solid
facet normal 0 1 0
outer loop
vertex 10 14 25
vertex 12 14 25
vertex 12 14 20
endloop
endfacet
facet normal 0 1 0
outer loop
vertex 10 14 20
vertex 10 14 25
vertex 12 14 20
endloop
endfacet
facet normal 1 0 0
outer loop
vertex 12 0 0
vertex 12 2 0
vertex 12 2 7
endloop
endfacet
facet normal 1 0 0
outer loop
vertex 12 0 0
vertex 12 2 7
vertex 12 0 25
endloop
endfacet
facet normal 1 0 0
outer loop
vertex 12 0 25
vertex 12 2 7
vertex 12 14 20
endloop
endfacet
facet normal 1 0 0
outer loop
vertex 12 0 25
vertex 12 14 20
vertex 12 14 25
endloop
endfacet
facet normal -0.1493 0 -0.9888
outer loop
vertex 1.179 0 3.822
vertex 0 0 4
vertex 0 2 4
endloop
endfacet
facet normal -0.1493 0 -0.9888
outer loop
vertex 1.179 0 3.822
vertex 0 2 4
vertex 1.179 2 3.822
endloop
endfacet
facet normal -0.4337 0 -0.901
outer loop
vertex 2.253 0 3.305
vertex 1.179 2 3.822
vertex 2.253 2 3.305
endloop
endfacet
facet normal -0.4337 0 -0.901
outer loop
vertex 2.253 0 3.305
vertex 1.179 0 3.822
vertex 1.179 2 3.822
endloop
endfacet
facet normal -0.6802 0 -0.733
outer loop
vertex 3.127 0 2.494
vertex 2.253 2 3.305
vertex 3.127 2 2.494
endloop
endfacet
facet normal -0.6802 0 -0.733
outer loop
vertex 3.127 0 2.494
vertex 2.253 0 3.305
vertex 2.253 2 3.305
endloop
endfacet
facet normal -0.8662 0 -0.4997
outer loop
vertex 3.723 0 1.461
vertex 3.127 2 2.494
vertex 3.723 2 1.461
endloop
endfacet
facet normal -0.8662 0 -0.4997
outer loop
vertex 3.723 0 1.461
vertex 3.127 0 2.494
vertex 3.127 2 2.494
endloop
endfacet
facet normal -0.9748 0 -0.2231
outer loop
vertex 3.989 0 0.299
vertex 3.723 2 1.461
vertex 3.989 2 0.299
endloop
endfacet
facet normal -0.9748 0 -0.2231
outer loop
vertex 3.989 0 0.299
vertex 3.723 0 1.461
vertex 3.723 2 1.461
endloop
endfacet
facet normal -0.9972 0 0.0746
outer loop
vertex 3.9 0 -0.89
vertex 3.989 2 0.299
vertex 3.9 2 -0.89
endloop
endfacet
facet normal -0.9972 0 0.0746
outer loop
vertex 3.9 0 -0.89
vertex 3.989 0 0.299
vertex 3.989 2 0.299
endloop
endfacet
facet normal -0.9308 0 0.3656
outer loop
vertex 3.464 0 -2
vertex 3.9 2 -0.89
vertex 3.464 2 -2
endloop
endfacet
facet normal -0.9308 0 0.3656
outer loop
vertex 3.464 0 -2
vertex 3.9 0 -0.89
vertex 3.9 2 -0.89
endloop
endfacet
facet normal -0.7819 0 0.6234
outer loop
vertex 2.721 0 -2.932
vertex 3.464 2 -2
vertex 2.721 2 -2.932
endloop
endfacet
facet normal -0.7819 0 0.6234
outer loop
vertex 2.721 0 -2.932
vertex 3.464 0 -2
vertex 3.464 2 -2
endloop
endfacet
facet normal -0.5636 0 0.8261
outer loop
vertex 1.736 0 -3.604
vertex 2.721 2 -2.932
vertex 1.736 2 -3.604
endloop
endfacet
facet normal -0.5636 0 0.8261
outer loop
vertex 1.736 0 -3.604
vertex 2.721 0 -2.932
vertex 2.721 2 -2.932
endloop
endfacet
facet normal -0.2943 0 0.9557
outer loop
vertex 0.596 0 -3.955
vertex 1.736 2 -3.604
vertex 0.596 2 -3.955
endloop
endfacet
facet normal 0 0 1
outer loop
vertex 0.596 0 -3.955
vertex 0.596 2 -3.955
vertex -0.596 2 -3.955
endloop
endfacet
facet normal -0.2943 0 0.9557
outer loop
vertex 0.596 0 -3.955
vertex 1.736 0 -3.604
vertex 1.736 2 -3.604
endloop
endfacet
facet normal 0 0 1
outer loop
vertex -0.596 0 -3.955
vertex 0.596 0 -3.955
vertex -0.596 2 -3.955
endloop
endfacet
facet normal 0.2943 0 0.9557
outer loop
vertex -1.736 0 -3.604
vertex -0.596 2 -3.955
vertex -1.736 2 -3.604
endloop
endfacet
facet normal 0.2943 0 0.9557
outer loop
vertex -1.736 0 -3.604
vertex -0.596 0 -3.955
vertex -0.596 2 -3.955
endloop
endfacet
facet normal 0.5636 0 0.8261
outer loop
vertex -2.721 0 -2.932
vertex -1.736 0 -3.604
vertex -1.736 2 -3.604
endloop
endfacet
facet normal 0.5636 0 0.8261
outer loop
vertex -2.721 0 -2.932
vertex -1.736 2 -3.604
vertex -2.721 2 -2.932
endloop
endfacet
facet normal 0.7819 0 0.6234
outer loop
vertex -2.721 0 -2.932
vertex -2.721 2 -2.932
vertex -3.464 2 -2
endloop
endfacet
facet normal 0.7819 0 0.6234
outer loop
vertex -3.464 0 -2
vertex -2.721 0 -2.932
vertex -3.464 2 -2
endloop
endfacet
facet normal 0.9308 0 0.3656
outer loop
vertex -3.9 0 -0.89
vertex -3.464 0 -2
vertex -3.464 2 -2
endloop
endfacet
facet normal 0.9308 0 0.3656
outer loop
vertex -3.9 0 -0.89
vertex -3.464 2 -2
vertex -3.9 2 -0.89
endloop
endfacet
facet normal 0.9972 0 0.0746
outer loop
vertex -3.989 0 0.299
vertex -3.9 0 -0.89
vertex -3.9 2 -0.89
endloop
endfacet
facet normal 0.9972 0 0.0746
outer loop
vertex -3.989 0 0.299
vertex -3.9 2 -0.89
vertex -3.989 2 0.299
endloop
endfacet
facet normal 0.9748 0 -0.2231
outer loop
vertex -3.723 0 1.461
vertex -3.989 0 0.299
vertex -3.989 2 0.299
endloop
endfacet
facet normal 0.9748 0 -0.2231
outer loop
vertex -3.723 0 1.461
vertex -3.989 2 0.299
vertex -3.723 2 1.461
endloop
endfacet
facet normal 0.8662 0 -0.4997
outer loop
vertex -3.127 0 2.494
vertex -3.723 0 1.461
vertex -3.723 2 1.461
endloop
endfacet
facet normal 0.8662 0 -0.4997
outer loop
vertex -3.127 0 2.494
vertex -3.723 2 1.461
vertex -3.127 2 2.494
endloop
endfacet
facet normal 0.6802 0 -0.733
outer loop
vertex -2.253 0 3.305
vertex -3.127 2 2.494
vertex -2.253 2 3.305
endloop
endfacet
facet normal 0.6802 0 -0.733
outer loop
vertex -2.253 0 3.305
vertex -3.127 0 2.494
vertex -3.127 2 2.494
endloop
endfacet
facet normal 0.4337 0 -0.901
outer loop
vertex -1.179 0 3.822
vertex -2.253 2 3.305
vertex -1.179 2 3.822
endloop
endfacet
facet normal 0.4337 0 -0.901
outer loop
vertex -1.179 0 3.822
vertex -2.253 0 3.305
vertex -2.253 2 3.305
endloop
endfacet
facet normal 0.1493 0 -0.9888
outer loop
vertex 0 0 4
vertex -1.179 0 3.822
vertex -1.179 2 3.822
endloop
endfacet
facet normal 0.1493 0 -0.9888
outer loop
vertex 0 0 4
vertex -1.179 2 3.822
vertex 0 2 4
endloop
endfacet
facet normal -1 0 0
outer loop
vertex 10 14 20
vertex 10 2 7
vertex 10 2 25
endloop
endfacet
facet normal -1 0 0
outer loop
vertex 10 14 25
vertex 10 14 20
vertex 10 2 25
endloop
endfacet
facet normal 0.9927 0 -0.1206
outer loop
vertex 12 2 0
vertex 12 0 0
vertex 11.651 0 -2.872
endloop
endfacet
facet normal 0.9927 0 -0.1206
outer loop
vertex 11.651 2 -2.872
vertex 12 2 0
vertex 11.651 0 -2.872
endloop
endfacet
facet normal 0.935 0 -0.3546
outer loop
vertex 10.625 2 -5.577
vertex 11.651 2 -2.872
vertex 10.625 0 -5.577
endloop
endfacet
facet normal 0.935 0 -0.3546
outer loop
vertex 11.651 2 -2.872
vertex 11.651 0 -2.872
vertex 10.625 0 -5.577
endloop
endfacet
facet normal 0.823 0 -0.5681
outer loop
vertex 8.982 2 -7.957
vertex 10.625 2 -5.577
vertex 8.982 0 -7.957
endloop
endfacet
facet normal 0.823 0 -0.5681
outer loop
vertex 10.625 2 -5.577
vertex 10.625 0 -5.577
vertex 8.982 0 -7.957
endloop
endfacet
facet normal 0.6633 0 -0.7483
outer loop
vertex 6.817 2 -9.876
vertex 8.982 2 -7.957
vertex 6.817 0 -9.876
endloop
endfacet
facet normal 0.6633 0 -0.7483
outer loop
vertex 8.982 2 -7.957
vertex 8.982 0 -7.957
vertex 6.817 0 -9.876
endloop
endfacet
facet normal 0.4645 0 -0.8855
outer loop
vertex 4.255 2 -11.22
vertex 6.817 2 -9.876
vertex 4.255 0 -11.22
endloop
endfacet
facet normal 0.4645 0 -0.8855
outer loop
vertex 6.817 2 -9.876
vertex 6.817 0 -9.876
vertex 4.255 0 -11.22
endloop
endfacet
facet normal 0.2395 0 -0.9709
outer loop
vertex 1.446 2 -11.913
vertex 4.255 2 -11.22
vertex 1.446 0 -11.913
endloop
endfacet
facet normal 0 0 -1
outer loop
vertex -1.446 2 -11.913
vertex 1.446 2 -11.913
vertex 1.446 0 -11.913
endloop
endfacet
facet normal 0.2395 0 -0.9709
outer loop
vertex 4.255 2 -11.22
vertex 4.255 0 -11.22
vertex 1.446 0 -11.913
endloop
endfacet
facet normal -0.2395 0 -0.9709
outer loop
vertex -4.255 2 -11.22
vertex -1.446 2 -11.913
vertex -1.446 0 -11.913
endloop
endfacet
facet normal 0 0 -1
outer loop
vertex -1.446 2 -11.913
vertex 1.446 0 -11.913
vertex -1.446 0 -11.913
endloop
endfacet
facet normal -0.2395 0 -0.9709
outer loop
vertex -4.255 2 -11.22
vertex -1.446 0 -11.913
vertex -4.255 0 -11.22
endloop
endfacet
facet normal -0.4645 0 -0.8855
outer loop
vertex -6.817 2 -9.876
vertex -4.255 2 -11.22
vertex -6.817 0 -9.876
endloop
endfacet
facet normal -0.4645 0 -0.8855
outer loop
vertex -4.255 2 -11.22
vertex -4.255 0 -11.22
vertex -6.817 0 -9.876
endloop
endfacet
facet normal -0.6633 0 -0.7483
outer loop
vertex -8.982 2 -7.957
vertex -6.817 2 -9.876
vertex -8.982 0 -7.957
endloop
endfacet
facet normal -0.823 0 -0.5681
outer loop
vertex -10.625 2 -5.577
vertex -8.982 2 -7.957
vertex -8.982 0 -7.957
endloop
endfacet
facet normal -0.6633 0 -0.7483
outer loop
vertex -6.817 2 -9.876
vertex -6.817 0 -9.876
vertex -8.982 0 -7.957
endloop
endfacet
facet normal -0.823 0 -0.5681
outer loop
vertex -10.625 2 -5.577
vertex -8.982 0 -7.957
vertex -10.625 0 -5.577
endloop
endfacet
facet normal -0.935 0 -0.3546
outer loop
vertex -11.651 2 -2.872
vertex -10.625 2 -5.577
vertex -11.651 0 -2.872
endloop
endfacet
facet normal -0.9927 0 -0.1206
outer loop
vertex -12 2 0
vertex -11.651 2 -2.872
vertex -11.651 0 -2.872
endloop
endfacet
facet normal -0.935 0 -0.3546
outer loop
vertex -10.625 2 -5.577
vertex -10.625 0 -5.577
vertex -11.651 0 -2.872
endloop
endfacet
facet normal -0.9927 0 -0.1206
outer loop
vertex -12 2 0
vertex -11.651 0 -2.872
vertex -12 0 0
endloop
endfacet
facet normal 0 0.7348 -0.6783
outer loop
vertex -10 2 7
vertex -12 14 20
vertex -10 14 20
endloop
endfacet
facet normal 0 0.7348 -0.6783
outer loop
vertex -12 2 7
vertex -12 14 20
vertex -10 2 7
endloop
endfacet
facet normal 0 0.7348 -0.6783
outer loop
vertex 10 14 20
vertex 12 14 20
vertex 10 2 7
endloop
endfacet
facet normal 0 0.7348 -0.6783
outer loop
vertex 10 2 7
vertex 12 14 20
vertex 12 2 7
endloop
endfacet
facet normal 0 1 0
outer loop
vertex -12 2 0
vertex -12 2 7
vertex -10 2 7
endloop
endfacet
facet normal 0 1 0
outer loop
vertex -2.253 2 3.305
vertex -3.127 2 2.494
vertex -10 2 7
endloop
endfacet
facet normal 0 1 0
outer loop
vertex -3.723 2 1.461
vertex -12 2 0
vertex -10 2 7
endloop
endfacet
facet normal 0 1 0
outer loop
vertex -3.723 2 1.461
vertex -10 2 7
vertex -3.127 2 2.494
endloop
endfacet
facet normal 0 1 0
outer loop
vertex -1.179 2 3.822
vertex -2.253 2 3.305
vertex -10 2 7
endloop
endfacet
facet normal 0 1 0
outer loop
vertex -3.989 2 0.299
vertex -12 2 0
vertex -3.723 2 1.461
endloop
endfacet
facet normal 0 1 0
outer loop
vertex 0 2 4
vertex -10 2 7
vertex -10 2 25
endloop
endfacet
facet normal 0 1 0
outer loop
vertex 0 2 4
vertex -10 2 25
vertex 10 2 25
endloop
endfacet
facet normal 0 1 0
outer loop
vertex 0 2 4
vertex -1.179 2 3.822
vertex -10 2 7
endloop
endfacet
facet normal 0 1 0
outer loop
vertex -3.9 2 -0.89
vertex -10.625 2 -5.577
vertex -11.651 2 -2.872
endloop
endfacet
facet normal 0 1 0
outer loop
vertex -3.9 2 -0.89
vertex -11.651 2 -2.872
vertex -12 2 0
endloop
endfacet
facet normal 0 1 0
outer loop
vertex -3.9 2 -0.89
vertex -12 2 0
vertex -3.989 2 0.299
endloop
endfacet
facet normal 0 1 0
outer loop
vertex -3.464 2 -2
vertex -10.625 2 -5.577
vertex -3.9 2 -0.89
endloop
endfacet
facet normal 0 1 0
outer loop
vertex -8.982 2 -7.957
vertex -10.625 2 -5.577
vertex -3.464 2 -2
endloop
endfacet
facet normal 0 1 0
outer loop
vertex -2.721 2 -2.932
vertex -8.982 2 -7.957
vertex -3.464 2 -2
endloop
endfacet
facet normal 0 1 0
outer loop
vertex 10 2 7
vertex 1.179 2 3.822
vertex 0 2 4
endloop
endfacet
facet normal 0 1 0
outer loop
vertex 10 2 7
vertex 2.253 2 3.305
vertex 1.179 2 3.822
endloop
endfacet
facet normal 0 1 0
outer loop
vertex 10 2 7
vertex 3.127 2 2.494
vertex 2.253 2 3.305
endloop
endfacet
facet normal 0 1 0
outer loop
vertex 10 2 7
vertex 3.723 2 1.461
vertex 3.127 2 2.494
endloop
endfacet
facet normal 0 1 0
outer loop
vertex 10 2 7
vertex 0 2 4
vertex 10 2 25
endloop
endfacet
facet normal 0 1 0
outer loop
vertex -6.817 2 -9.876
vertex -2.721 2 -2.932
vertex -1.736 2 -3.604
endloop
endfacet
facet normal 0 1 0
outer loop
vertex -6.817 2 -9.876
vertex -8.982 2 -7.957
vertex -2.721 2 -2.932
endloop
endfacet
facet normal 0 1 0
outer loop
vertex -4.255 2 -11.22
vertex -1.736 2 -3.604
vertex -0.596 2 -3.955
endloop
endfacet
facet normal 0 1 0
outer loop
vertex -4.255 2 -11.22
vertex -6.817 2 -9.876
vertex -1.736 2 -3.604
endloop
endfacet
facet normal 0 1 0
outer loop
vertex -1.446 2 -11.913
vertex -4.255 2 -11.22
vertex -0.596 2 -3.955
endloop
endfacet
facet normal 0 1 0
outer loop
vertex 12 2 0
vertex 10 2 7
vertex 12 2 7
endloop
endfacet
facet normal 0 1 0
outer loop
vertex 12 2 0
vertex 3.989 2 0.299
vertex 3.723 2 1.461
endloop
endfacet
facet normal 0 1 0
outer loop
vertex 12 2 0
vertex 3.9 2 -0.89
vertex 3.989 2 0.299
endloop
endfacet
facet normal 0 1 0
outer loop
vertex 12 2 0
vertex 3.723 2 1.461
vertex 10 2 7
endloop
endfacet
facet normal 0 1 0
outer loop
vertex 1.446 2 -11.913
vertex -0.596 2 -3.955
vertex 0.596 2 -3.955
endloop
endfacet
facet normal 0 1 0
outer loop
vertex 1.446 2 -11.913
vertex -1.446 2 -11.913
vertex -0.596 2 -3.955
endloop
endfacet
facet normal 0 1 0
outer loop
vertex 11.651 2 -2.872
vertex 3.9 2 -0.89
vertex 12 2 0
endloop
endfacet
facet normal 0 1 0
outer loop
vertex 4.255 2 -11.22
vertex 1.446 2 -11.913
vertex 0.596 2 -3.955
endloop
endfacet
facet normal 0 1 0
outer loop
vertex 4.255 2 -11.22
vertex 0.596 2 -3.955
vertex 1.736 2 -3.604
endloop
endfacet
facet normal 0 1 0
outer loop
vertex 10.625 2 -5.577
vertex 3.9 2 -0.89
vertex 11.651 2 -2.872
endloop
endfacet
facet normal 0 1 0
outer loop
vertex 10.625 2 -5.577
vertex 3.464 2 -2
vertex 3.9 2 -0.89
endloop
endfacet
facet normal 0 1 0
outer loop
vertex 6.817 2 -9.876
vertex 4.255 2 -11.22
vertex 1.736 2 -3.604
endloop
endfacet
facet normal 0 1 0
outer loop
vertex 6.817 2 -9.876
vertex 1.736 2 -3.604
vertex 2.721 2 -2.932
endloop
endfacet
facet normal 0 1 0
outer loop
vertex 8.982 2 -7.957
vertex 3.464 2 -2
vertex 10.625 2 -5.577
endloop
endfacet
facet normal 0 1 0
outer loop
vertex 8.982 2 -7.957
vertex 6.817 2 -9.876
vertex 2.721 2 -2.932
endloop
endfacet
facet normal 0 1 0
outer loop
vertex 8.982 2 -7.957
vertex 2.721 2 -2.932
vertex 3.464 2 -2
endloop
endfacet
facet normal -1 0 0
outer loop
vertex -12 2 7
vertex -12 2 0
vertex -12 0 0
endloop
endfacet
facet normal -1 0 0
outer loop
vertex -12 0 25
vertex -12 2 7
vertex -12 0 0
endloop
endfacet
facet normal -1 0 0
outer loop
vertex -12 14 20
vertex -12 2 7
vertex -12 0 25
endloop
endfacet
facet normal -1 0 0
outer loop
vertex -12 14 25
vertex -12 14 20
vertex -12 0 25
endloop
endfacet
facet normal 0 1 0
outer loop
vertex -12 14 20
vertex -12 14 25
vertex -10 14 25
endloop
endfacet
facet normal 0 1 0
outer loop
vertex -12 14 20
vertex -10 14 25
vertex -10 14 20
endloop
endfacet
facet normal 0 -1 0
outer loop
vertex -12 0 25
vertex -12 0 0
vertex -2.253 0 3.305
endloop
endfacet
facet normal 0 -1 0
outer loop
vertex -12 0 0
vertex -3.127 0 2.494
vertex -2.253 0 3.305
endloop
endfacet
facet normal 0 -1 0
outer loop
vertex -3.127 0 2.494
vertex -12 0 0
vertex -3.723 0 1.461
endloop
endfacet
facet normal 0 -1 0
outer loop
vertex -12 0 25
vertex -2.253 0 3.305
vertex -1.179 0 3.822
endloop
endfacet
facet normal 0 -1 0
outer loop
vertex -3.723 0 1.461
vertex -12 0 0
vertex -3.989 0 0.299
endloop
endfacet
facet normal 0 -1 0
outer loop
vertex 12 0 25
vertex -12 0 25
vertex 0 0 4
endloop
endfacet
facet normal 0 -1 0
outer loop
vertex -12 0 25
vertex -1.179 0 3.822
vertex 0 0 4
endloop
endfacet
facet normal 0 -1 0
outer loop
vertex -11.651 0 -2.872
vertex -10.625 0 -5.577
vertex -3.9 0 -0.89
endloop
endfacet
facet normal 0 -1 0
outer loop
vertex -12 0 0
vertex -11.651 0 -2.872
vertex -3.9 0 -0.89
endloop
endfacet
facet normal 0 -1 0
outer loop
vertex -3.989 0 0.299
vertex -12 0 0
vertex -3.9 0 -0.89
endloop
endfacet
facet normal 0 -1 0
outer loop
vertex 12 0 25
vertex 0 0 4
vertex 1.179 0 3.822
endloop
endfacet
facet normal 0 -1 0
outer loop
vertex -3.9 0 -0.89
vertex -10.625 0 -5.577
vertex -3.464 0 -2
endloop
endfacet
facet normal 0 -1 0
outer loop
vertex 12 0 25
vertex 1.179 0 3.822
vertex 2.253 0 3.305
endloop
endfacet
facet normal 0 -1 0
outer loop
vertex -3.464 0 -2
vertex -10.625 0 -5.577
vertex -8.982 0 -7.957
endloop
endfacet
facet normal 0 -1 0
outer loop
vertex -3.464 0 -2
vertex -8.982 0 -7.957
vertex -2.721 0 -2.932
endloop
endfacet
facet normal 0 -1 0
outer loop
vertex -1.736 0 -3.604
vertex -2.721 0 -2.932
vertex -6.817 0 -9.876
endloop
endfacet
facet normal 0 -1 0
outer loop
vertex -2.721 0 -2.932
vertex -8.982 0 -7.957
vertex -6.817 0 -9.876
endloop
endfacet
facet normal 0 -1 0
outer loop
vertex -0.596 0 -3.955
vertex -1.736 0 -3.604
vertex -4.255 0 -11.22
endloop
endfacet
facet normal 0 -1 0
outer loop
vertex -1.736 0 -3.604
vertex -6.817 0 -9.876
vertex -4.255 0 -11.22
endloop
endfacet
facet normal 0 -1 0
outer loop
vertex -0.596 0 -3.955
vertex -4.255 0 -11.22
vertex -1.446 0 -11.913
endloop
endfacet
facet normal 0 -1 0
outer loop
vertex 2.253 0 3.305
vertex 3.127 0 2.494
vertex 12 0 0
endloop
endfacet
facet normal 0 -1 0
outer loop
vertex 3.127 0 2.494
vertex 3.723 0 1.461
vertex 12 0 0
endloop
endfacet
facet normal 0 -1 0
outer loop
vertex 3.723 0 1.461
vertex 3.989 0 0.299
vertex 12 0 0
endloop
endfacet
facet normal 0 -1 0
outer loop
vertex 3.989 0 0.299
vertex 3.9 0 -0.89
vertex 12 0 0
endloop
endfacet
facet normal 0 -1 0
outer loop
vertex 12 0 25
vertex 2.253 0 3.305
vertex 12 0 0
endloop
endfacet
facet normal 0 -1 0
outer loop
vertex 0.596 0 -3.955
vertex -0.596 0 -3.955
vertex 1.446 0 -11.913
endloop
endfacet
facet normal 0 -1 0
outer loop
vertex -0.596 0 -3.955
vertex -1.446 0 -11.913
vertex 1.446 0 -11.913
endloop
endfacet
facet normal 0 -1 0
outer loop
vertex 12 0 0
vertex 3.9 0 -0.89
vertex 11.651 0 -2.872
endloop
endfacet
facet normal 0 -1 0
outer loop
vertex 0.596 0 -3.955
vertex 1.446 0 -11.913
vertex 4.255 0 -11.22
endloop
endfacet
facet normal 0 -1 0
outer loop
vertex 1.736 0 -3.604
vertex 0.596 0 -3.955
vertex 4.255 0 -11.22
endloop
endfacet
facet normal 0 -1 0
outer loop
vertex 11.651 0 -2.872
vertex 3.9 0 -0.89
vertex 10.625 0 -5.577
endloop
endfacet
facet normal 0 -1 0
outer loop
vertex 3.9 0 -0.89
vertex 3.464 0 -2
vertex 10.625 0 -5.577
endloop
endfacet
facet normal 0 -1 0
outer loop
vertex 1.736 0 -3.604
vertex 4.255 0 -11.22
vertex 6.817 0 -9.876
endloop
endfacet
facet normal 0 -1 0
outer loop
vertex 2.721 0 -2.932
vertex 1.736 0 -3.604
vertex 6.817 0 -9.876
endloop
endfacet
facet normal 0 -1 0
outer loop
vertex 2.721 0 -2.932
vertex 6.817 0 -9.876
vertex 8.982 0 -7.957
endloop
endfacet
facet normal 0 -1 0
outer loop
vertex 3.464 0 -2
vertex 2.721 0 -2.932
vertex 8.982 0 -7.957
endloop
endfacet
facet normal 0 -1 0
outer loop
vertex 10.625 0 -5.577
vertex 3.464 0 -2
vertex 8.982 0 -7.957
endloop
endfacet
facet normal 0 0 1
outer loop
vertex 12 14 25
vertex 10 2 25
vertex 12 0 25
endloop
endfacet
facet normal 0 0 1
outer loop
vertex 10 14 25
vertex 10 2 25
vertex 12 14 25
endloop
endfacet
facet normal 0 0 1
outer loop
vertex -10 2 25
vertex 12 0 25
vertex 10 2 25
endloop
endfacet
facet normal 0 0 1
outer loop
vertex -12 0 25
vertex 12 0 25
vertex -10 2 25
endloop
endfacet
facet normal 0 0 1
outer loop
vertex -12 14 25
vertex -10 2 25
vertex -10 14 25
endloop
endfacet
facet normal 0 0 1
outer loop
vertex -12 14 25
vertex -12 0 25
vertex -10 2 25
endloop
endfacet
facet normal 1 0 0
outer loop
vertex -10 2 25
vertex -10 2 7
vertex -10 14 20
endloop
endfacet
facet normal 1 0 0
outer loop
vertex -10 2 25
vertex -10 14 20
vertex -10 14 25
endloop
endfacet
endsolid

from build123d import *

# Parameters (mm, degrees)
SKETCH_1_R      = 12
SKETCH_1_R_2    = 4
EXTRUDE_1_DEPTH = 2
EXTRUDE_2_DEPTH = 2


with BuildPart() as part:
    # 草图1 → 凸台-拉伸1 (new body)
    # profile 1 of 2: a face of its own
    with BuildSketch(Plane(origin=(0, 0, 0), x_dir=(1, 0, 0), z_dir=(0, 1, 0))):
        Circle(SKETCH_1_R)
        with Locations(Location((0, 0, 0), (0, 0, 270))):
            Circle(SKETCH_1_R_2, mode=Mode.SUBTRACT)
    # profile 2 of 2: a face of its own
    with BuildSketch(Plane(origin=(0, 0, 0), x_dir=(1, 0, 0), z_dir=(0, 1, 0))):
        with BuildLine():
            ThreePointArc((12, 0), (0, -12), (-12, 0))
            Line((-12, 0), (-12, -25))
            Line((-12, -25), (12, -25))
            Line((12, -25), (12, 0))
        make_face()
    extrude(amount=EXTRUDE_1_DEPTH)

    # 草图3 → 凸台-拉伸2 (add)
    with BuildSketch(Plane(origin=(12, 0, 0), x_dir=(0, 0, -1), z_dir=(1, 0, 0))):
        Polygon((-25, 2), (-25, 14), (-20, 14), (-7, 2), align=None)
    extrude_2 = extrude(amount=-EXTRUDE_2_DEPTH)

    # 镜向1: 凸台-拉伸2 across plane
    add(extrude_2.mirror(Plane(origin=(0, 0, 0), x_dir=(0, 0, 1), z_dir=(1, 0, 0))))


solid = part.part
